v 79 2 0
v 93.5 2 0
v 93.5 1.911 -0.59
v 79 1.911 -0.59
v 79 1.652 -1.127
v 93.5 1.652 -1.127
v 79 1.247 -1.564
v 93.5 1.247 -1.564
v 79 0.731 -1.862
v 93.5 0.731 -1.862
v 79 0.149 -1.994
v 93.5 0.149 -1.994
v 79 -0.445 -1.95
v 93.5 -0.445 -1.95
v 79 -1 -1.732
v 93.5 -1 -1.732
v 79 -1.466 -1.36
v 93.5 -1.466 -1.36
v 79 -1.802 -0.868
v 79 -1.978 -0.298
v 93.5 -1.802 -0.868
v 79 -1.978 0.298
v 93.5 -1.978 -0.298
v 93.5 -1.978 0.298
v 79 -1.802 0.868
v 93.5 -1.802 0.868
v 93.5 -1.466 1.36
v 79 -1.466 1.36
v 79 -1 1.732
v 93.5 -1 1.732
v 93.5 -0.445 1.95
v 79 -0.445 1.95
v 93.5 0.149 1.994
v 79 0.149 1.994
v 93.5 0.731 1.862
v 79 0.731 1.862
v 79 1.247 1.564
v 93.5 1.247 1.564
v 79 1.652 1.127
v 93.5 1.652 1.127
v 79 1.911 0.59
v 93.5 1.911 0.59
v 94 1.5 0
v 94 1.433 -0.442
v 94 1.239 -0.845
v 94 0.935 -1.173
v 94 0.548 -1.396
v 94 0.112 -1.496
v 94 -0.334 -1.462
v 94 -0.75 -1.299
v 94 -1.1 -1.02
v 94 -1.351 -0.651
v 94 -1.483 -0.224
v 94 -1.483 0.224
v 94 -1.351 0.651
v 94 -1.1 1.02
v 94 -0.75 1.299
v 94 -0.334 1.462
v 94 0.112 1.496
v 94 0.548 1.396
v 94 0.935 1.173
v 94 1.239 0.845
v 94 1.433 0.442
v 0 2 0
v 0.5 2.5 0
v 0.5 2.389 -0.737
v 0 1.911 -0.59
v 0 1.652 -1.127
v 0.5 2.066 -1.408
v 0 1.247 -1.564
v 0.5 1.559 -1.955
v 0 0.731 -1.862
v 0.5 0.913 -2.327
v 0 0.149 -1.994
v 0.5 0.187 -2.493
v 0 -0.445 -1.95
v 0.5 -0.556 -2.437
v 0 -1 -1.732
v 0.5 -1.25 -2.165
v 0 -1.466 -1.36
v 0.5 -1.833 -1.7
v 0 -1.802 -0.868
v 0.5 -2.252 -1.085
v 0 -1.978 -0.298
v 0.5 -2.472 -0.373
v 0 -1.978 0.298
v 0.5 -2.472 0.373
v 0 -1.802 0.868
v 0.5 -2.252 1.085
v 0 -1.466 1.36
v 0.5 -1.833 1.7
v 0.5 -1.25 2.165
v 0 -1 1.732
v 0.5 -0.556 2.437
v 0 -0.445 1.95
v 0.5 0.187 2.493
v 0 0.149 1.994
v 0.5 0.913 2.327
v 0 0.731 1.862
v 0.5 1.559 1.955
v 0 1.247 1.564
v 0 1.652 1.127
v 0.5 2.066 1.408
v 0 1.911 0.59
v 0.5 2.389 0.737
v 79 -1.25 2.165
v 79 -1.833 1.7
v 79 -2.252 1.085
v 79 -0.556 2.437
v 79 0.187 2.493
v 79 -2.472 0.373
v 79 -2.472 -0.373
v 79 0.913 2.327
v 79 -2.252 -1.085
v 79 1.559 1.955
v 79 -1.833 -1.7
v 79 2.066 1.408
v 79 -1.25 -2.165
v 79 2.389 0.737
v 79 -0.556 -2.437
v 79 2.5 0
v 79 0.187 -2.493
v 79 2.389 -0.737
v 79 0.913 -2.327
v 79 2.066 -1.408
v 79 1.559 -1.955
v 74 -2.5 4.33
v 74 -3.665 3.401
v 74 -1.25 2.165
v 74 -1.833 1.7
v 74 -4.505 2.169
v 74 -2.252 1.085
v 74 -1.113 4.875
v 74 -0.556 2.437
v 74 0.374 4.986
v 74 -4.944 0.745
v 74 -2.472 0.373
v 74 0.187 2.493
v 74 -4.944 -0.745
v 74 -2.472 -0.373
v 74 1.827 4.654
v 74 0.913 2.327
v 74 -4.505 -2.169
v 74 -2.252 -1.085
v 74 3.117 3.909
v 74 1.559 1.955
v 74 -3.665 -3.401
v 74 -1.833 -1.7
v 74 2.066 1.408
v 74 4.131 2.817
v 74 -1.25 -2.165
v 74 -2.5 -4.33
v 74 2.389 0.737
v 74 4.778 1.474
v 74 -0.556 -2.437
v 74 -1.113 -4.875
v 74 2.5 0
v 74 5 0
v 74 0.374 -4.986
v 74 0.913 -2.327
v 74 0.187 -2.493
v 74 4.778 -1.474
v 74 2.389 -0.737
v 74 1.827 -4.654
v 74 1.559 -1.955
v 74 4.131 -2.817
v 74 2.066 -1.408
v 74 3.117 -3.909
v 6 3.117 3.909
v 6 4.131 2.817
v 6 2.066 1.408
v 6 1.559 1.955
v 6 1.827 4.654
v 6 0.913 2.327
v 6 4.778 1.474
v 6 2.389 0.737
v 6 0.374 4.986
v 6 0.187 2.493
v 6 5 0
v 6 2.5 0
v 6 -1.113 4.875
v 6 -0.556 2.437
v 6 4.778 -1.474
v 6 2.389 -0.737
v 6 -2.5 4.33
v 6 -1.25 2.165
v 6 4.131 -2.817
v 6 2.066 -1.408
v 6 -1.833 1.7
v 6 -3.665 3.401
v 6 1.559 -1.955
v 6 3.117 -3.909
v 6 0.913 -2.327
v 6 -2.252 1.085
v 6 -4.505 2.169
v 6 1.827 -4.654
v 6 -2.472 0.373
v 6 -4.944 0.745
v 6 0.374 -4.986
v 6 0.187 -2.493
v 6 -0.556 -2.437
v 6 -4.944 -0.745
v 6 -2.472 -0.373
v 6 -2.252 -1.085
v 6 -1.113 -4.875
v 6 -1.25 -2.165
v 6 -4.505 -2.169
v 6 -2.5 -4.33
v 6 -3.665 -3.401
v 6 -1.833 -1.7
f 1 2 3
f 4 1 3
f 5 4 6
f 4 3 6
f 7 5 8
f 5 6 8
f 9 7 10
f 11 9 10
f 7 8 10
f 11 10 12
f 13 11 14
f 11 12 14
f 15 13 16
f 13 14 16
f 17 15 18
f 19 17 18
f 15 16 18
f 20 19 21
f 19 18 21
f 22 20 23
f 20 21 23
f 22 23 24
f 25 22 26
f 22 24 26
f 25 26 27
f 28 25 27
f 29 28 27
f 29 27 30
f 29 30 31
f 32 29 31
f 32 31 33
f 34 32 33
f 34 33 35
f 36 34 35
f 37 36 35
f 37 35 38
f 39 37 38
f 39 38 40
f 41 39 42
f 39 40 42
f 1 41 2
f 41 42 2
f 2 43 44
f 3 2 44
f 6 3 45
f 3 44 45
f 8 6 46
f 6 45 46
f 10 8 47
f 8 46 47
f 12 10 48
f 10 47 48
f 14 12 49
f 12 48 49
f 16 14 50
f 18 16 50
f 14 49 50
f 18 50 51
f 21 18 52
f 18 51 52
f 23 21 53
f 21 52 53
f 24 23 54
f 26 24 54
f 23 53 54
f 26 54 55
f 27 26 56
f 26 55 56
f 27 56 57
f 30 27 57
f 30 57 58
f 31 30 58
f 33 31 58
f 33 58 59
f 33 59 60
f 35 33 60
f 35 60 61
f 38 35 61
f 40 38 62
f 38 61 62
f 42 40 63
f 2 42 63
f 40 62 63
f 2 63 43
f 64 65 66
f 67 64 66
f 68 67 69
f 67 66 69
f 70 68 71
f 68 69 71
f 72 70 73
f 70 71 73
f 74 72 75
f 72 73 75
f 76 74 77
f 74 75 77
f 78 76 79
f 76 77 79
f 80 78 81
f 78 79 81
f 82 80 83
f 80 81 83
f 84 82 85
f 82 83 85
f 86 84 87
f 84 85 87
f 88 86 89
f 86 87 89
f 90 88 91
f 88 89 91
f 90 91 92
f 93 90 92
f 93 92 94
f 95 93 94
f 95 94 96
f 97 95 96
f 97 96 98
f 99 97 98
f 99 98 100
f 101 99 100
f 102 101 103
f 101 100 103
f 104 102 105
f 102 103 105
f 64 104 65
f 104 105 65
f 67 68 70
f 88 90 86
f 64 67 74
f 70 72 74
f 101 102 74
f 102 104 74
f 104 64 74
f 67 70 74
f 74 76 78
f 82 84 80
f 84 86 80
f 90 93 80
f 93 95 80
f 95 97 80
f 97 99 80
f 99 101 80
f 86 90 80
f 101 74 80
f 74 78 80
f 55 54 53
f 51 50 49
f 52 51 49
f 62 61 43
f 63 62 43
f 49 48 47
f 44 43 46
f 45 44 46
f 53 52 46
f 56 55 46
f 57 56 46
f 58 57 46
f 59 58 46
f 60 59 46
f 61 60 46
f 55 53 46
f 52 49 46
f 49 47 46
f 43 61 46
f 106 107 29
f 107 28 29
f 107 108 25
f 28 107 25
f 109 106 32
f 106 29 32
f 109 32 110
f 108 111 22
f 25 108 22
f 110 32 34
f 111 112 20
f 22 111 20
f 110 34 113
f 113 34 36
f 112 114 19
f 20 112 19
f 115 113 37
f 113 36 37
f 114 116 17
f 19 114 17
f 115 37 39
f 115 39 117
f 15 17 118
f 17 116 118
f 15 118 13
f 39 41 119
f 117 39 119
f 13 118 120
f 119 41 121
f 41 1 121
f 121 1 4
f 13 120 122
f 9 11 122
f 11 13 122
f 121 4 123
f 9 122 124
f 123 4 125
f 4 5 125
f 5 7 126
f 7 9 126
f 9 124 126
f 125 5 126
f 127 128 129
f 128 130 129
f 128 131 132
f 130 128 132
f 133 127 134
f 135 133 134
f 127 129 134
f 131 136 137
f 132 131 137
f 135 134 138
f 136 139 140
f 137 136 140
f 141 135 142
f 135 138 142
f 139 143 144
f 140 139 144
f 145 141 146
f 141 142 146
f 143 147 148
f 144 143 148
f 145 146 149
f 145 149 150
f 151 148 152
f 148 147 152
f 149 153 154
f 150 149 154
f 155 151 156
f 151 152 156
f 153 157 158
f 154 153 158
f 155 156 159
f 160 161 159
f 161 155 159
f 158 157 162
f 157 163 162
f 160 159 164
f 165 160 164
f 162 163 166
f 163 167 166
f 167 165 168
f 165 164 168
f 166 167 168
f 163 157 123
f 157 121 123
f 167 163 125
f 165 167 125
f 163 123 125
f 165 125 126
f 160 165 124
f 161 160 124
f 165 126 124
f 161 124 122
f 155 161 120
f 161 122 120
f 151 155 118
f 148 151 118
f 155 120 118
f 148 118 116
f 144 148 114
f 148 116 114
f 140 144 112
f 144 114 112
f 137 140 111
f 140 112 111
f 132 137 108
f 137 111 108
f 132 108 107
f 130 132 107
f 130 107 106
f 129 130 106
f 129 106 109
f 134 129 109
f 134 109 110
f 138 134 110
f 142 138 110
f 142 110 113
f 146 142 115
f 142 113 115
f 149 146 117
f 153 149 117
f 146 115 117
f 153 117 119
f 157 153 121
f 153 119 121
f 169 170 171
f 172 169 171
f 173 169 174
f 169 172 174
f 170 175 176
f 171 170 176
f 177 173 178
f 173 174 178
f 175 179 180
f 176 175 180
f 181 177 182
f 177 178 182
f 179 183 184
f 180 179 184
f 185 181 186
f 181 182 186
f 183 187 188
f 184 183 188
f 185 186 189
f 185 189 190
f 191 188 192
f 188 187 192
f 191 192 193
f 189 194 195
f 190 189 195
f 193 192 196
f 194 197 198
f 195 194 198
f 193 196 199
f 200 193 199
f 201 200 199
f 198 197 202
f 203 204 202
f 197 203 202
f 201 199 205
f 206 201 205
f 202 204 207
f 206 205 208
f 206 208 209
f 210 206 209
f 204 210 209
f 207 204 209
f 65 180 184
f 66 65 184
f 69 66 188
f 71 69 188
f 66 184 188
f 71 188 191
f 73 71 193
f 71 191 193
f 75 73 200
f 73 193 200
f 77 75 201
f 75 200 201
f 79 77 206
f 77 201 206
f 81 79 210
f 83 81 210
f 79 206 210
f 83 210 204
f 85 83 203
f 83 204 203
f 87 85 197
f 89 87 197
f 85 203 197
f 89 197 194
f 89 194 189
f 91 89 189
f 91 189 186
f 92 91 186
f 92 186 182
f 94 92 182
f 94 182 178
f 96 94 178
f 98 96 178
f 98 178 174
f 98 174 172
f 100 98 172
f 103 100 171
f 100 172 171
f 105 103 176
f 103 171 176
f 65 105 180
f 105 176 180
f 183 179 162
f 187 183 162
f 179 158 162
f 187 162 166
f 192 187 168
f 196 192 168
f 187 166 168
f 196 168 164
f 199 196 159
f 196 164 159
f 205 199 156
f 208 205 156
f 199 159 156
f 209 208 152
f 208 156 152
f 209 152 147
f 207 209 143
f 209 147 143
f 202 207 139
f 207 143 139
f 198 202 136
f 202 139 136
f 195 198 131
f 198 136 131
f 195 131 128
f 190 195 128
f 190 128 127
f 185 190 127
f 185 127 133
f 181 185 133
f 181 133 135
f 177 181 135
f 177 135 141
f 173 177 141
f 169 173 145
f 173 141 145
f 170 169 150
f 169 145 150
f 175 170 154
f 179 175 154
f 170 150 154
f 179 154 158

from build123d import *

# Parameters (mm, degrees)
CHAMFER1_SIZE = 0.5


with BuildPart() as part:
    # Sketch1 → Revolve1 (revolve)
    with BuildSketch(Plane.XY):
        Polygon((0, 0), (0, 2.5), (6, 2.5), (6, 5), (74, 5), (74, 2.5), (79, 2.5), (79, 2), (94, 2), (94, 0), align=None)
    revolve(axis=Axis((94, 0, 0), (-1, 0, 0)))

    # Chamfer1
    chamfer1_edges = [part.edges().sort_by_distance(p)[0] for p in [
        (0, -2.5, 0),
        (94, -2, 0),
    ]]
    chamfer(chamfer1_edges, length=CHAMFER1_SIZE)


solid = part.part
